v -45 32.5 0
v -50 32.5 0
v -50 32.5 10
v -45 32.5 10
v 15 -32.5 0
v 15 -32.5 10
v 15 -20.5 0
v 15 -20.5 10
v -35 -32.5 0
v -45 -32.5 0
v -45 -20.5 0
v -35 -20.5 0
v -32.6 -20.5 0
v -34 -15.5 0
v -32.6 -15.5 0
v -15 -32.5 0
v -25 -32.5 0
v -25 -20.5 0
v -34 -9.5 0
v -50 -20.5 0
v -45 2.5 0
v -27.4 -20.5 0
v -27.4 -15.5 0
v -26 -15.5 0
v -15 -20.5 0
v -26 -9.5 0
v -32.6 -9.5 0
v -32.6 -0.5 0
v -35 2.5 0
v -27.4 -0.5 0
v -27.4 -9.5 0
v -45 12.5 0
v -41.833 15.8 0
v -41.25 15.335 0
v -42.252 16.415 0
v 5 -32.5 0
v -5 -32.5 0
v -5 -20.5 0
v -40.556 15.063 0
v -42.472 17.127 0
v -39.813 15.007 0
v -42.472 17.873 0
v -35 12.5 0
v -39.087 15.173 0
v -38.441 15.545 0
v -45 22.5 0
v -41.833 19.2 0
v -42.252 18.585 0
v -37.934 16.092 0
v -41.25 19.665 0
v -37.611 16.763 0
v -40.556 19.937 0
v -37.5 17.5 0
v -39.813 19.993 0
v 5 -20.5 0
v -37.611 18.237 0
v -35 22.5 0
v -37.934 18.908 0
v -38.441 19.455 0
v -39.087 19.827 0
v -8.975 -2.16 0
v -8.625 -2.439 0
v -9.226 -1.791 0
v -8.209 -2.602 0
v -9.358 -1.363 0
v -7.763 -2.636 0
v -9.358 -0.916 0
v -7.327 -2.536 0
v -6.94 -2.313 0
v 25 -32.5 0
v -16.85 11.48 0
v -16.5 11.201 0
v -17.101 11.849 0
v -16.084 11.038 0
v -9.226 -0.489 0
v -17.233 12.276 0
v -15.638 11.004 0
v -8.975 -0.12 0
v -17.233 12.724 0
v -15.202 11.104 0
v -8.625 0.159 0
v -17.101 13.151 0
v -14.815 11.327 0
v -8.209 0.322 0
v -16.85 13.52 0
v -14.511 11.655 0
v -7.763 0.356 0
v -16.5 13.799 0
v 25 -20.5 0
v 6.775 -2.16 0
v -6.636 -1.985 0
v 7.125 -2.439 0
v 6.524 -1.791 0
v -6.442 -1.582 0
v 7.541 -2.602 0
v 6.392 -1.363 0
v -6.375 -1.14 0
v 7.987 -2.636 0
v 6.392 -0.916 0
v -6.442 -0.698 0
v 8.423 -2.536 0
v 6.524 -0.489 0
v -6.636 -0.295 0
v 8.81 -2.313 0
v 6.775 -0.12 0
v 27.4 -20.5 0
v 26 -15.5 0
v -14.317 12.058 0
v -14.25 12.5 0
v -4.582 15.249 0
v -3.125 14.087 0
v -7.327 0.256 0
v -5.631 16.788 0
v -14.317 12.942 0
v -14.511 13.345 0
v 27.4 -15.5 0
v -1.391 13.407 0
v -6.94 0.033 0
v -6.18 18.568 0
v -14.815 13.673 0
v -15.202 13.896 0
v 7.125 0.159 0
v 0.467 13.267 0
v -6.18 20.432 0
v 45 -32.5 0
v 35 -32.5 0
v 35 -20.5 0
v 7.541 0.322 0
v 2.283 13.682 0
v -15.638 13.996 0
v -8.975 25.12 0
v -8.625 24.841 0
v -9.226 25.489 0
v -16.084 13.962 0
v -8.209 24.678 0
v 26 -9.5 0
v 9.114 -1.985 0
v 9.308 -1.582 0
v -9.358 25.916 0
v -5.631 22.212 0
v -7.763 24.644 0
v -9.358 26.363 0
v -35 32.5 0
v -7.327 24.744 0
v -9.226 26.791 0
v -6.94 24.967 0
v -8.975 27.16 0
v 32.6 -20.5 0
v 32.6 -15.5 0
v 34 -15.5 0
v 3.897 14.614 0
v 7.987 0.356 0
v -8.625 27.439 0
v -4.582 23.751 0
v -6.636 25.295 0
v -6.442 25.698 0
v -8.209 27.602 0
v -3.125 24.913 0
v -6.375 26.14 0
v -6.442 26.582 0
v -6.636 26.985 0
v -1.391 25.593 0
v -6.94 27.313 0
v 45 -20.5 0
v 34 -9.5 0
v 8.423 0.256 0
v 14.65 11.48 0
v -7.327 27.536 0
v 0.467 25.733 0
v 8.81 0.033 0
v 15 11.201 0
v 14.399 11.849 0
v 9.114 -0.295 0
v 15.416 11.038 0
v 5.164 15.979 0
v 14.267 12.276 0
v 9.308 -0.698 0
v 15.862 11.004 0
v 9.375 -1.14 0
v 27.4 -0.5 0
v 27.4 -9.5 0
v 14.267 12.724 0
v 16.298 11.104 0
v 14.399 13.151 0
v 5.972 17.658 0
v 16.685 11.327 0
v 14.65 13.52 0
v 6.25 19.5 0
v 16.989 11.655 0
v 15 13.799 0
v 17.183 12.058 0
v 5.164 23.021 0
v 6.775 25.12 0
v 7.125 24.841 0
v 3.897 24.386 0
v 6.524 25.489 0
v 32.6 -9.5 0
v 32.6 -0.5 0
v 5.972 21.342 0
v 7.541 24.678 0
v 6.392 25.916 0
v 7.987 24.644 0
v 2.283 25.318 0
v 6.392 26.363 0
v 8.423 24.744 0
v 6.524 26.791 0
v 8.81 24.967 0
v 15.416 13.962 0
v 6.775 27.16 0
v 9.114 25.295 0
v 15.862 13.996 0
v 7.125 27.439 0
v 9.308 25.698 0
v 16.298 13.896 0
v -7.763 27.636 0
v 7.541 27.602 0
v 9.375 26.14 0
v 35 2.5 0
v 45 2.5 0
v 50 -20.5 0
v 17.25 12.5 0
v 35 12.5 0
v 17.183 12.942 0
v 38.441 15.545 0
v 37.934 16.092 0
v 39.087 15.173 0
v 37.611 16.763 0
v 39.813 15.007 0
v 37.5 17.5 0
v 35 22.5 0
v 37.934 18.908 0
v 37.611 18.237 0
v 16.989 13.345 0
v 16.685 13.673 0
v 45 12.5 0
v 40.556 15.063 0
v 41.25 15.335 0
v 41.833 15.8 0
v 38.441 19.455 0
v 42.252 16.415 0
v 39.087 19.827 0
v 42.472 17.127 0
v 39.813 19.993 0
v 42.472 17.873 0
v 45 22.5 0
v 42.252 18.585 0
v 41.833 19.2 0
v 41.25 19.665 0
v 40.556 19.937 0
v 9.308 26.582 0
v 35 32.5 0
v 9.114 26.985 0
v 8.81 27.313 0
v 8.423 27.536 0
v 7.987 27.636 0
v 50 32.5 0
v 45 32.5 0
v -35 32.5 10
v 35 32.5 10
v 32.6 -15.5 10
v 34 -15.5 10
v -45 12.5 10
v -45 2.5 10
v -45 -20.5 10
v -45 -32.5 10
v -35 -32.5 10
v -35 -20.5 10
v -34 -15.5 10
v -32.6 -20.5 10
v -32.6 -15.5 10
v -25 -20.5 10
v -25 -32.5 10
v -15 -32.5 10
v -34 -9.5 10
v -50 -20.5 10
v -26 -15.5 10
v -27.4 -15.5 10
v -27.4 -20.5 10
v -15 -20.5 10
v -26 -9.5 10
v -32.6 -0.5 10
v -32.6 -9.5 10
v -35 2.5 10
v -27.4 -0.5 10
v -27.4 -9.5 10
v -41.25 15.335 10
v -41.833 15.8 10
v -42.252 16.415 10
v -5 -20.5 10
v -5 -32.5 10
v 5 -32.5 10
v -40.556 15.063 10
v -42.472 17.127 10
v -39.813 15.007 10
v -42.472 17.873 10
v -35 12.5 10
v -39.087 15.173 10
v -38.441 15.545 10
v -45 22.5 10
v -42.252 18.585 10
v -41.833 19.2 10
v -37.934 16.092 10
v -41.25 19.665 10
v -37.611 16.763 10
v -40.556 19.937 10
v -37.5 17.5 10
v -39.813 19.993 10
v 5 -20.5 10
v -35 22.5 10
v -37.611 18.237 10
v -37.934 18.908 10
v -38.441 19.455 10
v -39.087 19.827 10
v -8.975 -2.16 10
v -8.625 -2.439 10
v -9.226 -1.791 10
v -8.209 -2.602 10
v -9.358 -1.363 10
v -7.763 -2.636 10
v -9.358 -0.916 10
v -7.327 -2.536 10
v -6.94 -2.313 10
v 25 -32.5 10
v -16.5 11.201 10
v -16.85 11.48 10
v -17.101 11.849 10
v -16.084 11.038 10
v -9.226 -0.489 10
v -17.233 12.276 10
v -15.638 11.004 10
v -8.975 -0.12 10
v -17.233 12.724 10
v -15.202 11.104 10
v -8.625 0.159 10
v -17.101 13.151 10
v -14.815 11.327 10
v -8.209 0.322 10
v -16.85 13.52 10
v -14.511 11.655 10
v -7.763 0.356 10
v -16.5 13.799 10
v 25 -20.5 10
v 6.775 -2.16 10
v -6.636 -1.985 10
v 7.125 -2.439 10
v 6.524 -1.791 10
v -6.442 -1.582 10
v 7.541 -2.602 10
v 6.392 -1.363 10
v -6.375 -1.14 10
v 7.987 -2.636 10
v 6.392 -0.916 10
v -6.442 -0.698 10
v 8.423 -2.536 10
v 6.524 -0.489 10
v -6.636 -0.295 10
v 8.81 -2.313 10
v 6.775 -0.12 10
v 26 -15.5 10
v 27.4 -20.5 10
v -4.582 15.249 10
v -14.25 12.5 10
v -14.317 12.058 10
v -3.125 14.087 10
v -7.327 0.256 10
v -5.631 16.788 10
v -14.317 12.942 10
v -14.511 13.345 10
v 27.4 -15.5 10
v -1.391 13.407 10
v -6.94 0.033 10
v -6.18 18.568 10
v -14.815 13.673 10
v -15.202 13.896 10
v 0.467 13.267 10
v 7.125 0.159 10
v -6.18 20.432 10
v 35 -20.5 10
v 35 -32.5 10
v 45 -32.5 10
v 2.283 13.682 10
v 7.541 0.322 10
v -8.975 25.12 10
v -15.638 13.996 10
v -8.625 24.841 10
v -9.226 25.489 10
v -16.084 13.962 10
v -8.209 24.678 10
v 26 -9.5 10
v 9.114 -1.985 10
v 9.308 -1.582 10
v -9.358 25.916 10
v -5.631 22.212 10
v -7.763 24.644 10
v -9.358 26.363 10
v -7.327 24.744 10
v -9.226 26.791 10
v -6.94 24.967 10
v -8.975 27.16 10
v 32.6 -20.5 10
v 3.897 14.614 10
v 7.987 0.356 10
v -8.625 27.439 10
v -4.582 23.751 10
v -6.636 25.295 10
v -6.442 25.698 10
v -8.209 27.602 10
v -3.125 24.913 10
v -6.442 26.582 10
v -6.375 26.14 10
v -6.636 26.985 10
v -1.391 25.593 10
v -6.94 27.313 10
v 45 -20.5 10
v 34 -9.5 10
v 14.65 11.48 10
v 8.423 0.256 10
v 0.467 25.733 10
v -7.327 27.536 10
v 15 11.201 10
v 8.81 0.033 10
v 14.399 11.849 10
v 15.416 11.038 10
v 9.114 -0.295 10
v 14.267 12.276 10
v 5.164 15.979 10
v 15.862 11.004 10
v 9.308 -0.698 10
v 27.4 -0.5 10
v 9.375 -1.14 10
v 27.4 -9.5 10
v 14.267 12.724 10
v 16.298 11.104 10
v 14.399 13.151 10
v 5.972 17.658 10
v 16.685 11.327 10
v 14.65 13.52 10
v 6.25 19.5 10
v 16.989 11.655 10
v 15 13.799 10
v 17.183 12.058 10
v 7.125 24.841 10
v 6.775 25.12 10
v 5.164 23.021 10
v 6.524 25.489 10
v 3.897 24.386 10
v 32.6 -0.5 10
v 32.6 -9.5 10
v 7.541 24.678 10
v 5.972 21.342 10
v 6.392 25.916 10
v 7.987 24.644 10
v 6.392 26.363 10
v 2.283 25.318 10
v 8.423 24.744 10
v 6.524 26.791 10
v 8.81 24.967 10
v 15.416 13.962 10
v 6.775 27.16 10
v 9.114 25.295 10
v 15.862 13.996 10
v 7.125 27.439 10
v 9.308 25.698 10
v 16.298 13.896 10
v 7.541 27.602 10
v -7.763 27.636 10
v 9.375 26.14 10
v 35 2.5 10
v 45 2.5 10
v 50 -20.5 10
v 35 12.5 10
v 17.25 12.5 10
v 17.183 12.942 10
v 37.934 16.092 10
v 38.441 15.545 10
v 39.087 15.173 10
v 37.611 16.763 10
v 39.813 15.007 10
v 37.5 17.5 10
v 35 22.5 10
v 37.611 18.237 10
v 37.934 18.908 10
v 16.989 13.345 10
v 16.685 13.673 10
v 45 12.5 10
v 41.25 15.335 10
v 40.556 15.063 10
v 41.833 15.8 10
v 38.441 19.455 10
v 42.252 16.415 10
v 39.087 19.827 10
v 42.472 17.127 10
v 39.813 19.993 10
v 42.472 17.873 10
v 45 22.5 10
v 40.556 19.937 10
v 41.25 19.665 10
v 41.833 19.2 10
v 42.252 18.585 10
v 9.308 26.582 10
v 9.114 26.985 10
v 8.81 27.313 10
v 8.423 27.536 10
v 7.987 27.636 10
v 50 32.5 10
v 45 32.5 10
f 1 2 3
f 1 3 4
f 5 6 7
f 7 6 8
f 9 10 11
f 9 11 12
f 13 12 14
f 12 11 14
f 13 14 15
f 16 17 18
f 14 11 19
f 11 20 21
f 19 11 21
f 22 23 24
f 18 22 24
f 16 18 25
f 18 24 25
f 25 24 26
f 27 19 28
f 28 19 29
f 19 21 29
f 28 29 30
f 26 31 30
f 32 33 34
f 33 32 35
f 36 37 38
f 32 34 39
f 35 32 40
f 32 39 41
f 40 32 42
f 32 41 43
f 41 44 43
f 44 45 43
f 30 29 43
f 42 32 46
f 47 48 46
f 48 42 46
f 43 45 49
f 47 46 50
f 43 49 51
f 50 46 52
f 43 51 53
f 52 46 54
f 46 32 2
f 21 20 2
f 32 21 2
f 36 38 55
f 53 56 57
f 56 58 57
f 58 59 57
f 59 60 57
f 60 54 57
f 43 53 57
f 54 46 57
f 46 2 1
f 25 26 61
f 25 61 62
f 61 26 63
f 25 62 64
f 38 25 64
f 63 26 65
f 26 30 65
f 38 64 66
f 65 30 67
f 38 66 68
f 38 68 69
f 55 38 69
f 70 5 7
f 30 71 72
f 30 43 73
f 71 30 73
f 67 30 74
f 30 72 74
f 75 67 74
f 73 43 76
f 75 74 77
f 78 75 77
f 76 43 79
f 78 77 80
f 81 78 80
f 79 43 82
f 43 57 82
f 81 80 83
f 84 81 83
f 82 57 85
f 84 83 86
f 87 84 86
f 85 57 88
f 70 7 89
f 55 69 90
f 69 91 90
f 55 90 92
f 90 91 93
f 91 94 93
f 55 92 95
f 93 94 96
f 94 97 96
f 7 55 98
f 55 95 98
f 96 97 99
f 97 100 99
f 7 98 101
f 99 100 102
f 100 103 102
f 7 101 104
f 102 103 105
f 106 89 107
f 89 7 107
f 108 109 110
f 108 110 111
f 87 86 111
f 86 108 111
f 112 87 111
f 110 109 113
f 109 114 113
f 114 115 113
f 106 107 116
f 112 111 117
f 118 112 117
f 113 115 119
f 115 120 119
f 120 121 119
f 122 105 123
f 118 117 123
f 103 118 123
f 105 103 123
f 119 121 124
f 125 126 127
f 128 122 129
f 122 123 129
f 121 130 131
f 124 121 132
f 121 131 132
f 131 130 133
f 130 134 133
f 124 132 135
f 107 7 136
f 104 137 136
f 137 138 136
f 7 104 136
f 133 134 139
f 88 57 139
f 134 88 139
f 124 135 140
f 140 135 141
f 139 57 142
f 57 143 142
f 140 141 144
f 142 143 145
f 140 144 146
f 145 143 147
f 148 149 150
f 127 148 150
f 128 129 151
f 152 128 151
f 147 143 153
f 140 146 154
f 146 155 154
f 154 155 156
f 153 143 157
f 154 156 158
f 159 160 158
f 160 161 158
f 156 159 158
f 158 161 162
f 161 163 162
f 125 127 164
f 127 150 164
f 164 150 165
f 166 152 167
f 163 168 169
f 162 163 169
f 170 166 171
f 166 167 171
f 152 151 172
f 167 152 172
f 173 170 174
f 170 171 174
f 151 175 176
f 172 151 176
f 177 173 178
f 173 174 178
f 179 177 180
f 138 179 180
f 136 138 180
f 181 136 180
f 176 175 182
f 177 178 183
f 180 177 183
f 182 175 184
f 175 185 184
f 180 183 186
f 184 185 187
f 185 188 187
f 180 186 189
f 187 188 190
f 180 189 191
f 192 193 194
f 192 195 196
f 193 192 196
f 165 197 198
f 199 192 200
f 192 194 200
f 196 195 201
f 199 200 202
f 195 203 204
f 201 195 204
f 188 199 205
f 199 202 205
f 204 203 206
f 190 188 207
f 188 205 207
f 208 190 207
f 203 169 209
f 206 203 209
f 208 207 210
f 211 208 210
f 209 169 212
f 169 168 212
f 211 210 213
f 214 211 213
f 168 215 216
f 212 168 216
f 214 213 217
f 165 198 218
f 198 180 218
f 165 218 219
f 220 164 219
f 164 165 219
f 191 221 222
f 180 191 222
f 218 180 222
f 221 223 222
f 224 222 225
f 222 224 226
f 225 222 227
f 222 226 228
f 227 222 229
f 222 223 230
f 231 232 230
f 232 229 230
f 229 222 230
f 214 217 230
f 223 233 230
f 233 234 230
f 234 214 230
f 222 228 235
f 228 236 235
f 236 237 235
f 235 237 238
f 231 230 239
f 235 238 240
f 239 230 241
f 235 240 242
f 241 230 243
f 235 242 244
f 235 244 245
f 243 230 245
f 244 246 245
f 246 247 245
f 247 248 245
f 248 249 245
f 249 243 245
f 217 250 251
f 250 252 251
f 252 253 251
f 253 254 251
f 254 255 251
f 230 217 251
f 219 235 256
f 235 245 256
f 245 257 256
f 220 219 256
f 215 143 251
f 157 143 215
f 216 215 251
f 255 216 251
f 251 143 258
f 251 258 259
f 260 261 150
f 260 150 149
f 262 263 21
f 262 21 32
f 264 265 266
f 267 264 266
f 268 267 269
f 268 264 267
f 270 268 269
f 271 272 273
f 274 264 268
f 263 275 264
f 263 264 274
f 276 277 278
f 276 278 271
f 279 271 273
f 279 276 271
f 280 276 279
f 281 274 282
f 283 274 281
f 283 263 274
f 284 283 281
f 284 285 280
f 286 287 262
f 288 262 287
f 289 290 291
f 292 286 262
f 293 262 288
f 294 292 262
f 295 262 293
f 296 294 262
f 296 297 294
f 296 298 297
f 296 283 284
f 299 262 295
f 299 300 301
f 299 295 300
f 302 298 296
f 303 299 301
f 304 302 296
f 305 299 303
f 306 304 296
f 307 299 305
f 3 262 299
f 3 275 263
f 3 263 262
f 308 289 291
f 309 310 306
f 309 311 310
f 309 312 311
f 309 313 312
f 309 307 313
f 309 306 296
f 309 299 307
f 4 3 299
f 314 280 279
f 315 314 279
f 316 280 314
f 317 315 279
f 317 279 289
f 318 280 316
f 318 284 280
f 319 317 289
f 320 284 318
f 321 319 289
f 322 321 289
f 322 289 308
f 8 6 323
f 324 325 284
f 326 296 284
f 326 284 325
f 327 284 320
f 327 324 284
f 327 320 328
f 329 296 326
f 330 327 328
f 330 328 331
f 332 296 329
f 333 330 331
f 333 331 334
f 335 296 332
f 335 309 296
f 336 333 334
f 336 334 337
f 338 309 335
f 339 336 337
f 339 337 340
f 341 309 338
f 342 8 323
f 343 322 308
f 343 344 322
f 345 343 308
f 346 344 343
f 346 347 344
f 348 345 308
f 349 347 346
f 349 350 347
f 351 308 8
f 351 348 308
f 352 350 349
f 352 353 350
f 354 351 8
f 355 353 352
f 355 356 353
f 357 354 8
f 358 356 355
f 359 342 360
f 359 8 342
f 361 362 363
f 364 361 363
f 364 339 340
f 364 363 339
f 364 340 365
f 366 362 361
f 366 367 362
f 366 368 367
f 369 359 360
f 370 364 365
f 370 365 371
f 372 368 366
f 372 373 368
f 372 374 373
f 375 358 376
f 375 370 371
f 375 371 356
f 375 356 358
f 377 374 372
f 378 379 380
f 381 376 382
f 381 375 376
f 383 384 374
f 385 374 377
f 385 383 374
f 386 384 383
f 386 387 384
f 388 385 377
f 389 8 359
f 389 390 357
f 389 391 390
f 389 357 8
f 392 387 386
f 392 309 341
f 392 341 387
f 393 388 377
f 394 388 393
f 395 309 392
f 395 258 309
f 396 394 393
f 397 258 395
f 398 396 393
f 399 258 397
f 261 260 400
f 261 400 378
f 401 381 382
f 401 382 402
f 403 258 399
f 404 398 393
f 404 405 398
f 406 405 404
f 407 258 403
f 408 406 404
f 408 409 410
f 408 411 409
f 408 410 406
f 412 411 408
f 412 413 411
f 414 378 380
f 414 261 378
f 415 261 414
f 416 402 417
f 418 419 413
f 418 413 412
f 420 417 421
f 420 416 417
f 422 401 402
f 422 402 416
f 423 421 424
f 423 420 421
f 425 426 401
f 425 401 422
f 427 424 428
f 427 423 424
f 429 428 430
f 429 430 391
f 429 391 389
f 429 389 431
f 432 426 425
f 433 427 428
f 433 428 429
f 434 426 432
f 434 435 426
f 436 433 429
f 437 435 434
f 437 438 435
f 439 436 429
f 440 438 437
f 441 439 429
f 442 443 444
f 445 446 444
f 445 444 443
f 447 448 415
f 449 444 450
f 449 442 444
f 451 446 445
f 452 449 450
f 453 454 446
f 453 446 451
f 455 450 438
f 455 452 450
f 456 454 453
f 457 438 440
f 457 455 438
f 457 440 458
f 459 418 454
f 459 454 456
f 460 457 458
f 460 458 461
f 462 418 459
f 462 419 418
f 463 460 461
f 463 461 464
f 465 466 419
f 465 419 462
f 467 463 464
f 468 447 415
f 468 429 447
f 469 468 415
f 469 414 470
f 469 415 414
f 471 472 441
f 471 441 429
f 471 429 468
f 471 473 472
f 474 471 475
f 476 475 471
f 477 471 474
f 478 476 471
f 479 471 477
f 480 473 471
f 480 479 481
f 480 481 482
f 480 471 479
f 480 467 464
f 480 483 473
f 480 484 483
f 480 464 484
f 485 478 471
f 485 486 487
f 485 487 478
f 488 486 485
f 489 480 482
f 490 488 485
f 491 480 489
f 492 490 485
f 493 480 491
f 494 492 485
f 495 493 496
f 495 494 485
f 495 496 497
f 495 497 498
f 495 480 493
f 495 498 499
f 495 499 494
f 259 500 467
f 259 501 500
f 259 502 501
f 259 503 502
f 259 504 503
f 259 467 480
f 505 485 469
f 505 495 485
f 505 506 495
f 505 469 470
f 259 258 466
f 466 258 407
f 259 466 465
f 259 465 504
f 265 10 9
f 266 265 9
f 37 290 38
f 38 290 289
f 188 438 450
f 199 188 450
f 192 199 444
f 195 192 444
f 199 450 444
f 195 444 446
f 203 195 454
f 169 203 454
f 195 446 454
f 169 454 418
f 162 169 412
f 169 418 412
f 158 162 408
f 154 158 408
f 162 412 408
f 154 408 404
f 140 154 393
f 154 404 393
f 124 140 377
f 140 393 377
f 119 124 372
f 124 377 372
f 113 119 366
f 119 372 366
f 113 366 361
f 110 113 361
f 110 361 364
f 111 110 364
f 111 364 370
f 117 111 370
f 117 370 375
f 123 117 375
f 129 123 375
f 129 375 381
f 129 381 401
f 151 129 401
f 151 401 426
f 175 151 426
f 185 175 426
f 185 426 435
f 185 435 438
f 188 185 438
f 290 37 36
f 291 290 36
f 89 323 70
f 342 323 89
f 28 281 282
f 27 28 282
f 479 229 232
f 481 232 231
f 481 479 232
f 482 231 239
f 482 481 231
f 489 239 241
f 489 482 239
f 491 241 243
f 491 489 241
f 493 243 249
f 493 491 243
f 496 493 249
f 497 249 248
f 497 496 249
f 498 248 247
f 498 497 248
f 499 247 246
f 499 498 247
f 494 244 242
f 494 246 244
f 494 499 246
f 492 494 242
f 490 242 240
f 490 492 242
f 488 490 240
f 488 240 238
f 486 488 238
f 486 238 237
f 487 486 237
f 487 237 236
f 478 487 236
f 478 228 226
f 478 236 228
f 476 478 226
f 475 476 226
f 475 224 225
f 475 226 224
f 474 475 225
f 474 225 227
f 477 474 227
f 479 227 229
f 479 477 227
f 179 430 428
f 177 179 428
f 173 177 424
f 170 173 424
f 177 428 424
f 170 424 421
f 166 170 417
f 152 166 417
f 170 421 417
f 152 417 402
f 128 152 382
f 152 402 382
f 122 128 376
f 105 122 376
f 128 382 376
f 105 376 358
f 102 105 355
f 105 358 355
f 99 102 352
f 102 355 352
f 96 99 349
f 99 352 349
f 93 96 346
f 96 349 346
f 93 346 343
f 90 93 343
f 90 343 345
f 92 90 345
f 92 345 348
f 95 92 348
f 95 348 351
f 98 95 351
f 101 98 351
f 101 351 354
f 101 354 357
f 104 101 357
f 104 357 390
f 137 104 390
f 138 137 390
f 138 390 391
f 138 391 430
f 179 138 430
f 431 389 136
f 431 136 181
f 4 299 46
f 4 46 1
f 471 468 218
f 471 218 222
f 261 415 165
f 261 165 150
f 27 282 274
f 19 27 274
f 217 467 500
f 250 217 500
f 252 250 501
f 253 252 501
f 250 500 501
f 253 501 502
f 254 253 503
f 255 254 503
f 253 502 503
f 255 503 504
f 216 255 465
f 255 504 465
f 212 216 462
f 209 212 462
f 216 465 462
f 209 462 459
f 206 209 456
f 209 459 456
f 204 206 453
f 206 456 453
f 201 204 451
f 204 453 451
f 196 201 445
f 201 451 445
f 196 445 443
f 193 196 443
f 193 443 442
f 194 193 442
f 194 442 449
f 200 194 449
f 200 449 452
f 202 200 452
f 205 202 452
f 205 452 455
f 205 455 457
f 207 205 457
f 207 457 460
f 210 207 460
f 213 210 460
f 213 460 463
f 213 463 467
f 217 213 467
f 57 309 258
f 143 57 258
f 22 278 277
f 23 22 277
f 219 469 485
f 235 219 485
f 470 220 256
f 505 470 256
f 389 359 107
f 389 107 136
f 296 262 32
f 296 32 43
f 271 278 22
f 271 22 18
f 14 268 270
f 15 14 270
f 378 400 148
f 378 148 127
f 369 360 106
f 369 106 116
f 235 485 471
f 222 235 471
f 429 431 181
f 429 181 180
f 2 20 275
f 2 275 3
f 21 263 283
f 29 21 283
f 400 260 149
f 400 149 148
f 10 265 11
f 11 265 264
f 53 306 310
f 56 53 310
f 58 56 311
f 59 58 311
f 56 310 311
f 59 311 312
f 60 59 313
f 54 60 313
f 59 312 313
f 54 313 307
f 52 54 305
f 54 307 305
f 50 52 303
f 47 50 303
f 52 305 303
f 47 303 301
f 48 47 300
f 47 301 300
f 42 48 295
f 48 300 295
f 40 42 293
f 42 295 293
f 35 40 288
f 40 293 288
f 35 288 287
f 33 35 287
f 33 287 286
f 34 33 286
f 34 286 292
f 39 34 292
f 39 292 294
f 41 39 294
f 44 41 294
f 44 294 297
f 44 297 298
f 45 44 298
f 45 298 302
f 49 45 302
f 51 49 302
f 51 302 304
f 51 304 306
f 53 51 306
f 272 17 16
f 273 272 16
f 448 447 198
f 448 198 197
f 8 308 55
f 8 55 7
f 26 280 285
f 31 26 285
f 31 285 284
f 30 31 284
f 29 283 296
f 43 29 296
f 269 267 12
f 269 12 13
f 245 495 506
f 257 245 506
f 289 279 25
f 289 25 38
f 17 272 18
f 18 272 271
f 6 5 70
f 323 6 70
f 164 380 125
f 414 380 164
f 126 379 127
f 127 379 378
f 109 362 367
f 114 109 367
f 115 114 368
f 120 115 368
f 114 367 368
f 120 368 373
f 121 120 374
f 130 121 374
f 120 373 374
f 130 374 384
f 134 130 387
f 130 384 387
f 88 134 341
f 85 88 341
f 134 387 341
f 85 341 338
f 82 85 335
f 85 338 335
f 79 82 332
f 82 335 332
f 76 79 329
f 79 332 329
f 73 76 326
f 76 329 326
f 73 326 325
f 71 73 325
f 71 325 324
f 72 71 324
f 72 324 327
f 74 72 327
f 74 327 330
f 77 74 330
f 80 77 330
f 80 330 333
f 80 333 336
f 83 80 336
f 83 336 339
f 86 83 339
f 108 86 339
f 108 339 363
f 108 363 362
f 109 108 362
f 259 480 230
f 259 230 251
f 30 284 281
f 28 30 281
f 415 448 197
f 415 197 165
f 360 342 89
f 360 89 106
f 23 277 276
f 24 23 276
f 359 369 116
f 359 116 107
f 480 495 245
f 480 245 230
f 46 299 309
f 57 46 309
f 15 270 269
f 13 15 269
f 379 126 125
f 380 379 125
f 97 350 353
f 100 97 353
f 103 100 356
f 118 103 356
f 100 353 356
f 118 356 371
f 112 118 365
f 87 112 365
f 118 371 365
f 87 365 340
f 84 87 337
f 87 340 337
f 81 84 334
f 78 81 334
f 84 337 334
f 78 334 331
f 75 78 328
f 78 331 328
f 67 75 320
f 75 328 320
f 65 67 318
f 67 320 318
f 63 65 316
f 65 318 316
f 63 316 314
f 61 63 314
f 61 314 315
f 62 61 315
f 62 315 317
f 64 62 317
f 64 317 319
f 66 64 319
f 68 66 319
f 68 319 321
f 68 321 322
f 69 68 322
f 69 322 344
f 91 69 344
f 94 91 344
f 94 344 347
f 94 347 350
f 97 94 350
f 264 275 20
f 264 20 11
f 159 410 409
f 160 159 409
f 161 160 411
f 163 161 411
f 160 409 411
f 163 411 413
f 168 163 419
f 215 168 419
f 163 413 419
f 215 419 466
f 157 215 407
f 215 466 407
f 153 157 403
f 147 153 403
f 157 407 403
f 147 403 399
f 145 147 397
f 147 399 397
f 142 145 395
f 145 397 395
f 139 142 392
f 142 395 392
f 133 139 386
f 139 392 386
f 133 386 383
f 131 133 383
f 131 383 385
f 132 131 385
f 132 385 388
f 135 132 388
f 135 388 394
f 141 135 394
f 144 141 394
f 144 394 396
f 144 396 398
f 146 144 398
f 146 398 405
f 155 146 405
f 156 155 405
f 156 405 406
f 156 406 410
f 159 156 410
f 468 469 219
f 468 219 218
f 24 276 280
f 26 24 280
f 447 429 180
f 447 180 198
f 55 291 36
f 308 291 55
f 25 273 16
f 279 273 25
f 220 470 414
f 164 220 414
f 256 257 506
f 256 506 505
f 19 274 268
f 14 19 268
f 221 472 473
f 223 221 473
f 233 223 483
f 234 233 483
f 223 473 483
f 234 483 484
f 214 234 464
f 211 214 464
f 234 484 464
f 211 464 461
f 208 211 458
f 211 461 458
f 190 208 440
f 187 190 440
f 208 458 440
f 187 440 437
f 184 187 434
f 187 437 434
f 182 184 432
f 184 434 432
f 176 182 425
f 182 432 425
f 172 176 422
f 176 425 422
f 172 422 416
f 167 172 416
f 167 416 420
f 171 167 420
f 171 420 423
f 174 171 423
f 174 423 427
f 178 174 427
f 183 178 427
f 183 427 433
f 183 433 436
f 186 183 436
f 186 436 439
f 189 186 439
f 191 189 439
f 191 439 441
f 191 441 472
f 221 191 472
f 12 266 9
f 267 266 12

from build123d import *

# Parameters (mm, degrees)
SKETCH1_W           = 100
SKETCH1_H           = 65
BOSS_EXTRUDE1_DEPTH = 10
SKETCH2_R           = 1.5
SKETCH2_R_2         = 6.25
CUT_EXTRUDE1_DEPTH  = 61.466933112
SKETCH3_W           = 10
SKETCH3_H           = 12
CUT_EXTRUDE2_DEPTH  = 61.466933112
LPATTERN1_COUNT     = 4
LPATTERN1_PITCH     = 20
SKETCH4_W           = 5
SKETCH4_H           = 12
CUT_EXTRUDE3_DEPTH  = 61.466933112
SKETCH6_R           = 2.5
SKETCH6_W           = 10
SKETCH6_H           = 10
CUT_EXTRUDE4_DEPTH  = 61.466933112


with BuildPart() as part:
    # Sketch1 → Boss-Extrude1 (new body)
    with BuildSketch(Plane.XY):
        Rectangle(SKETCH1_W, SKETCH1_H)
    extrude(amount=BOSS_EXTRUDE1_DEPTH)

    # Sketch2 → Cut-Extrude1 (cut, through all)
    with BuildSketch(Plane.XY.offset(10)):
        with Locations((-15.75, 12.5)):
            Circle(SKETCH2_R)
        with Locations((-7.875, 26.13990011)):
            Circle(SKETCH2_R)
        with Locations((7.875, 26.13990011)):
            Circle(SKETCH2_R)
        with Locations((15.75, 12.5)):
            Circle(SKETCH2_R)
        with Locations((7.875, -1.13990011)):
            Circle(SKETCH2_R)
        with Locations((-7.875, -1.13990011)):
            Circle(SKETCH2_R)
        with Locations((0, 19.5)):
            Circle(SKETCH2_R_2)
    extrude(amount=-CUT_EXTRUDE1_DEPTH, mode=Mode.SUBTRACT)

    # Sketch3 → Cut-Extrude2 (cut, through all)
    with BuildSketch(Plane.XY.offset(10)):
        with Locations((-30, -26.5)):
            Rectangle(SKETCH3_W, SKETCH3_H)
    cut_extrude2 = extrude(amount=-CUT_EXTRUDE2_DEPTH, mode=Mode.SUBTRACT)

    # LPattern1: Cut-Extrude2 ×4
    with Locations(*[(i * LPATTERN1_PITCH, 0, 0) for i in range(1, LPATTERN1_COUNT)]):
        add(cut_extrude2, mode=Mode.SUBTRACT)

    # Sketch4 → Cut-Extrude3 (cut, through all)
    with BuildSketch(Plane.XY.offset(10)):
        with Locations((-47.5, -26.5)):
            Rectangle(SKETCH4_W, SKETCH4_H)
        Polygon((-34, -9.5), (-34, -15.5), (-32.6, -15.5), (-32.6, -20.5), (-27.4, -20.5), (-27.4, -15.5), (-26, -15.5), (-26, -9.5), (-27.4, -9.5), (-27.4, -0.5), (-32.6, -0.5), (-32.6, -9.5), align=None)
    cut_extrude3 = extrude(amount=-CUT_EXTRUDE3_DEPTH, mode=Mode.SUBTRACT)

    # Sketch6 → Cut-Extrude4 (cut, through all)
    with BuildSketch(Plane.XY.offset(10)):
        with Locations((-40, 17.5)):
            Circle(SKETCH6_R)
        with Locations((-40, 27.5)):
            Rectangle(SKETCH6_W, SKETCH6_H)
        with Locations((-40, 7.5)):
            Rectangle(SKETCH6_W, SKETCH6_H)
    cut_extrude4 = extrude(amount=-CUT_EXTRUDE4_DEPTH, mode=Mode.SUBTRACT)

    # Mirror1: Cut-Extrude3, Cut-Extrude4 across plane
    add(cut_extrude3.mirror(Plane(origin=(0, 0, 0), x_dir=(0, 0, 1), z_dir=(1, 0, 0))), mode=Mode.SUBTRACT)
    add(cut_extrude4.mirror(Plane(origin=(0, 0, 0), x_dir=(0, 0, 1), z_dir=(1, 0, 0))), mode=Mode.SUBTRACT)


solid = part.part
